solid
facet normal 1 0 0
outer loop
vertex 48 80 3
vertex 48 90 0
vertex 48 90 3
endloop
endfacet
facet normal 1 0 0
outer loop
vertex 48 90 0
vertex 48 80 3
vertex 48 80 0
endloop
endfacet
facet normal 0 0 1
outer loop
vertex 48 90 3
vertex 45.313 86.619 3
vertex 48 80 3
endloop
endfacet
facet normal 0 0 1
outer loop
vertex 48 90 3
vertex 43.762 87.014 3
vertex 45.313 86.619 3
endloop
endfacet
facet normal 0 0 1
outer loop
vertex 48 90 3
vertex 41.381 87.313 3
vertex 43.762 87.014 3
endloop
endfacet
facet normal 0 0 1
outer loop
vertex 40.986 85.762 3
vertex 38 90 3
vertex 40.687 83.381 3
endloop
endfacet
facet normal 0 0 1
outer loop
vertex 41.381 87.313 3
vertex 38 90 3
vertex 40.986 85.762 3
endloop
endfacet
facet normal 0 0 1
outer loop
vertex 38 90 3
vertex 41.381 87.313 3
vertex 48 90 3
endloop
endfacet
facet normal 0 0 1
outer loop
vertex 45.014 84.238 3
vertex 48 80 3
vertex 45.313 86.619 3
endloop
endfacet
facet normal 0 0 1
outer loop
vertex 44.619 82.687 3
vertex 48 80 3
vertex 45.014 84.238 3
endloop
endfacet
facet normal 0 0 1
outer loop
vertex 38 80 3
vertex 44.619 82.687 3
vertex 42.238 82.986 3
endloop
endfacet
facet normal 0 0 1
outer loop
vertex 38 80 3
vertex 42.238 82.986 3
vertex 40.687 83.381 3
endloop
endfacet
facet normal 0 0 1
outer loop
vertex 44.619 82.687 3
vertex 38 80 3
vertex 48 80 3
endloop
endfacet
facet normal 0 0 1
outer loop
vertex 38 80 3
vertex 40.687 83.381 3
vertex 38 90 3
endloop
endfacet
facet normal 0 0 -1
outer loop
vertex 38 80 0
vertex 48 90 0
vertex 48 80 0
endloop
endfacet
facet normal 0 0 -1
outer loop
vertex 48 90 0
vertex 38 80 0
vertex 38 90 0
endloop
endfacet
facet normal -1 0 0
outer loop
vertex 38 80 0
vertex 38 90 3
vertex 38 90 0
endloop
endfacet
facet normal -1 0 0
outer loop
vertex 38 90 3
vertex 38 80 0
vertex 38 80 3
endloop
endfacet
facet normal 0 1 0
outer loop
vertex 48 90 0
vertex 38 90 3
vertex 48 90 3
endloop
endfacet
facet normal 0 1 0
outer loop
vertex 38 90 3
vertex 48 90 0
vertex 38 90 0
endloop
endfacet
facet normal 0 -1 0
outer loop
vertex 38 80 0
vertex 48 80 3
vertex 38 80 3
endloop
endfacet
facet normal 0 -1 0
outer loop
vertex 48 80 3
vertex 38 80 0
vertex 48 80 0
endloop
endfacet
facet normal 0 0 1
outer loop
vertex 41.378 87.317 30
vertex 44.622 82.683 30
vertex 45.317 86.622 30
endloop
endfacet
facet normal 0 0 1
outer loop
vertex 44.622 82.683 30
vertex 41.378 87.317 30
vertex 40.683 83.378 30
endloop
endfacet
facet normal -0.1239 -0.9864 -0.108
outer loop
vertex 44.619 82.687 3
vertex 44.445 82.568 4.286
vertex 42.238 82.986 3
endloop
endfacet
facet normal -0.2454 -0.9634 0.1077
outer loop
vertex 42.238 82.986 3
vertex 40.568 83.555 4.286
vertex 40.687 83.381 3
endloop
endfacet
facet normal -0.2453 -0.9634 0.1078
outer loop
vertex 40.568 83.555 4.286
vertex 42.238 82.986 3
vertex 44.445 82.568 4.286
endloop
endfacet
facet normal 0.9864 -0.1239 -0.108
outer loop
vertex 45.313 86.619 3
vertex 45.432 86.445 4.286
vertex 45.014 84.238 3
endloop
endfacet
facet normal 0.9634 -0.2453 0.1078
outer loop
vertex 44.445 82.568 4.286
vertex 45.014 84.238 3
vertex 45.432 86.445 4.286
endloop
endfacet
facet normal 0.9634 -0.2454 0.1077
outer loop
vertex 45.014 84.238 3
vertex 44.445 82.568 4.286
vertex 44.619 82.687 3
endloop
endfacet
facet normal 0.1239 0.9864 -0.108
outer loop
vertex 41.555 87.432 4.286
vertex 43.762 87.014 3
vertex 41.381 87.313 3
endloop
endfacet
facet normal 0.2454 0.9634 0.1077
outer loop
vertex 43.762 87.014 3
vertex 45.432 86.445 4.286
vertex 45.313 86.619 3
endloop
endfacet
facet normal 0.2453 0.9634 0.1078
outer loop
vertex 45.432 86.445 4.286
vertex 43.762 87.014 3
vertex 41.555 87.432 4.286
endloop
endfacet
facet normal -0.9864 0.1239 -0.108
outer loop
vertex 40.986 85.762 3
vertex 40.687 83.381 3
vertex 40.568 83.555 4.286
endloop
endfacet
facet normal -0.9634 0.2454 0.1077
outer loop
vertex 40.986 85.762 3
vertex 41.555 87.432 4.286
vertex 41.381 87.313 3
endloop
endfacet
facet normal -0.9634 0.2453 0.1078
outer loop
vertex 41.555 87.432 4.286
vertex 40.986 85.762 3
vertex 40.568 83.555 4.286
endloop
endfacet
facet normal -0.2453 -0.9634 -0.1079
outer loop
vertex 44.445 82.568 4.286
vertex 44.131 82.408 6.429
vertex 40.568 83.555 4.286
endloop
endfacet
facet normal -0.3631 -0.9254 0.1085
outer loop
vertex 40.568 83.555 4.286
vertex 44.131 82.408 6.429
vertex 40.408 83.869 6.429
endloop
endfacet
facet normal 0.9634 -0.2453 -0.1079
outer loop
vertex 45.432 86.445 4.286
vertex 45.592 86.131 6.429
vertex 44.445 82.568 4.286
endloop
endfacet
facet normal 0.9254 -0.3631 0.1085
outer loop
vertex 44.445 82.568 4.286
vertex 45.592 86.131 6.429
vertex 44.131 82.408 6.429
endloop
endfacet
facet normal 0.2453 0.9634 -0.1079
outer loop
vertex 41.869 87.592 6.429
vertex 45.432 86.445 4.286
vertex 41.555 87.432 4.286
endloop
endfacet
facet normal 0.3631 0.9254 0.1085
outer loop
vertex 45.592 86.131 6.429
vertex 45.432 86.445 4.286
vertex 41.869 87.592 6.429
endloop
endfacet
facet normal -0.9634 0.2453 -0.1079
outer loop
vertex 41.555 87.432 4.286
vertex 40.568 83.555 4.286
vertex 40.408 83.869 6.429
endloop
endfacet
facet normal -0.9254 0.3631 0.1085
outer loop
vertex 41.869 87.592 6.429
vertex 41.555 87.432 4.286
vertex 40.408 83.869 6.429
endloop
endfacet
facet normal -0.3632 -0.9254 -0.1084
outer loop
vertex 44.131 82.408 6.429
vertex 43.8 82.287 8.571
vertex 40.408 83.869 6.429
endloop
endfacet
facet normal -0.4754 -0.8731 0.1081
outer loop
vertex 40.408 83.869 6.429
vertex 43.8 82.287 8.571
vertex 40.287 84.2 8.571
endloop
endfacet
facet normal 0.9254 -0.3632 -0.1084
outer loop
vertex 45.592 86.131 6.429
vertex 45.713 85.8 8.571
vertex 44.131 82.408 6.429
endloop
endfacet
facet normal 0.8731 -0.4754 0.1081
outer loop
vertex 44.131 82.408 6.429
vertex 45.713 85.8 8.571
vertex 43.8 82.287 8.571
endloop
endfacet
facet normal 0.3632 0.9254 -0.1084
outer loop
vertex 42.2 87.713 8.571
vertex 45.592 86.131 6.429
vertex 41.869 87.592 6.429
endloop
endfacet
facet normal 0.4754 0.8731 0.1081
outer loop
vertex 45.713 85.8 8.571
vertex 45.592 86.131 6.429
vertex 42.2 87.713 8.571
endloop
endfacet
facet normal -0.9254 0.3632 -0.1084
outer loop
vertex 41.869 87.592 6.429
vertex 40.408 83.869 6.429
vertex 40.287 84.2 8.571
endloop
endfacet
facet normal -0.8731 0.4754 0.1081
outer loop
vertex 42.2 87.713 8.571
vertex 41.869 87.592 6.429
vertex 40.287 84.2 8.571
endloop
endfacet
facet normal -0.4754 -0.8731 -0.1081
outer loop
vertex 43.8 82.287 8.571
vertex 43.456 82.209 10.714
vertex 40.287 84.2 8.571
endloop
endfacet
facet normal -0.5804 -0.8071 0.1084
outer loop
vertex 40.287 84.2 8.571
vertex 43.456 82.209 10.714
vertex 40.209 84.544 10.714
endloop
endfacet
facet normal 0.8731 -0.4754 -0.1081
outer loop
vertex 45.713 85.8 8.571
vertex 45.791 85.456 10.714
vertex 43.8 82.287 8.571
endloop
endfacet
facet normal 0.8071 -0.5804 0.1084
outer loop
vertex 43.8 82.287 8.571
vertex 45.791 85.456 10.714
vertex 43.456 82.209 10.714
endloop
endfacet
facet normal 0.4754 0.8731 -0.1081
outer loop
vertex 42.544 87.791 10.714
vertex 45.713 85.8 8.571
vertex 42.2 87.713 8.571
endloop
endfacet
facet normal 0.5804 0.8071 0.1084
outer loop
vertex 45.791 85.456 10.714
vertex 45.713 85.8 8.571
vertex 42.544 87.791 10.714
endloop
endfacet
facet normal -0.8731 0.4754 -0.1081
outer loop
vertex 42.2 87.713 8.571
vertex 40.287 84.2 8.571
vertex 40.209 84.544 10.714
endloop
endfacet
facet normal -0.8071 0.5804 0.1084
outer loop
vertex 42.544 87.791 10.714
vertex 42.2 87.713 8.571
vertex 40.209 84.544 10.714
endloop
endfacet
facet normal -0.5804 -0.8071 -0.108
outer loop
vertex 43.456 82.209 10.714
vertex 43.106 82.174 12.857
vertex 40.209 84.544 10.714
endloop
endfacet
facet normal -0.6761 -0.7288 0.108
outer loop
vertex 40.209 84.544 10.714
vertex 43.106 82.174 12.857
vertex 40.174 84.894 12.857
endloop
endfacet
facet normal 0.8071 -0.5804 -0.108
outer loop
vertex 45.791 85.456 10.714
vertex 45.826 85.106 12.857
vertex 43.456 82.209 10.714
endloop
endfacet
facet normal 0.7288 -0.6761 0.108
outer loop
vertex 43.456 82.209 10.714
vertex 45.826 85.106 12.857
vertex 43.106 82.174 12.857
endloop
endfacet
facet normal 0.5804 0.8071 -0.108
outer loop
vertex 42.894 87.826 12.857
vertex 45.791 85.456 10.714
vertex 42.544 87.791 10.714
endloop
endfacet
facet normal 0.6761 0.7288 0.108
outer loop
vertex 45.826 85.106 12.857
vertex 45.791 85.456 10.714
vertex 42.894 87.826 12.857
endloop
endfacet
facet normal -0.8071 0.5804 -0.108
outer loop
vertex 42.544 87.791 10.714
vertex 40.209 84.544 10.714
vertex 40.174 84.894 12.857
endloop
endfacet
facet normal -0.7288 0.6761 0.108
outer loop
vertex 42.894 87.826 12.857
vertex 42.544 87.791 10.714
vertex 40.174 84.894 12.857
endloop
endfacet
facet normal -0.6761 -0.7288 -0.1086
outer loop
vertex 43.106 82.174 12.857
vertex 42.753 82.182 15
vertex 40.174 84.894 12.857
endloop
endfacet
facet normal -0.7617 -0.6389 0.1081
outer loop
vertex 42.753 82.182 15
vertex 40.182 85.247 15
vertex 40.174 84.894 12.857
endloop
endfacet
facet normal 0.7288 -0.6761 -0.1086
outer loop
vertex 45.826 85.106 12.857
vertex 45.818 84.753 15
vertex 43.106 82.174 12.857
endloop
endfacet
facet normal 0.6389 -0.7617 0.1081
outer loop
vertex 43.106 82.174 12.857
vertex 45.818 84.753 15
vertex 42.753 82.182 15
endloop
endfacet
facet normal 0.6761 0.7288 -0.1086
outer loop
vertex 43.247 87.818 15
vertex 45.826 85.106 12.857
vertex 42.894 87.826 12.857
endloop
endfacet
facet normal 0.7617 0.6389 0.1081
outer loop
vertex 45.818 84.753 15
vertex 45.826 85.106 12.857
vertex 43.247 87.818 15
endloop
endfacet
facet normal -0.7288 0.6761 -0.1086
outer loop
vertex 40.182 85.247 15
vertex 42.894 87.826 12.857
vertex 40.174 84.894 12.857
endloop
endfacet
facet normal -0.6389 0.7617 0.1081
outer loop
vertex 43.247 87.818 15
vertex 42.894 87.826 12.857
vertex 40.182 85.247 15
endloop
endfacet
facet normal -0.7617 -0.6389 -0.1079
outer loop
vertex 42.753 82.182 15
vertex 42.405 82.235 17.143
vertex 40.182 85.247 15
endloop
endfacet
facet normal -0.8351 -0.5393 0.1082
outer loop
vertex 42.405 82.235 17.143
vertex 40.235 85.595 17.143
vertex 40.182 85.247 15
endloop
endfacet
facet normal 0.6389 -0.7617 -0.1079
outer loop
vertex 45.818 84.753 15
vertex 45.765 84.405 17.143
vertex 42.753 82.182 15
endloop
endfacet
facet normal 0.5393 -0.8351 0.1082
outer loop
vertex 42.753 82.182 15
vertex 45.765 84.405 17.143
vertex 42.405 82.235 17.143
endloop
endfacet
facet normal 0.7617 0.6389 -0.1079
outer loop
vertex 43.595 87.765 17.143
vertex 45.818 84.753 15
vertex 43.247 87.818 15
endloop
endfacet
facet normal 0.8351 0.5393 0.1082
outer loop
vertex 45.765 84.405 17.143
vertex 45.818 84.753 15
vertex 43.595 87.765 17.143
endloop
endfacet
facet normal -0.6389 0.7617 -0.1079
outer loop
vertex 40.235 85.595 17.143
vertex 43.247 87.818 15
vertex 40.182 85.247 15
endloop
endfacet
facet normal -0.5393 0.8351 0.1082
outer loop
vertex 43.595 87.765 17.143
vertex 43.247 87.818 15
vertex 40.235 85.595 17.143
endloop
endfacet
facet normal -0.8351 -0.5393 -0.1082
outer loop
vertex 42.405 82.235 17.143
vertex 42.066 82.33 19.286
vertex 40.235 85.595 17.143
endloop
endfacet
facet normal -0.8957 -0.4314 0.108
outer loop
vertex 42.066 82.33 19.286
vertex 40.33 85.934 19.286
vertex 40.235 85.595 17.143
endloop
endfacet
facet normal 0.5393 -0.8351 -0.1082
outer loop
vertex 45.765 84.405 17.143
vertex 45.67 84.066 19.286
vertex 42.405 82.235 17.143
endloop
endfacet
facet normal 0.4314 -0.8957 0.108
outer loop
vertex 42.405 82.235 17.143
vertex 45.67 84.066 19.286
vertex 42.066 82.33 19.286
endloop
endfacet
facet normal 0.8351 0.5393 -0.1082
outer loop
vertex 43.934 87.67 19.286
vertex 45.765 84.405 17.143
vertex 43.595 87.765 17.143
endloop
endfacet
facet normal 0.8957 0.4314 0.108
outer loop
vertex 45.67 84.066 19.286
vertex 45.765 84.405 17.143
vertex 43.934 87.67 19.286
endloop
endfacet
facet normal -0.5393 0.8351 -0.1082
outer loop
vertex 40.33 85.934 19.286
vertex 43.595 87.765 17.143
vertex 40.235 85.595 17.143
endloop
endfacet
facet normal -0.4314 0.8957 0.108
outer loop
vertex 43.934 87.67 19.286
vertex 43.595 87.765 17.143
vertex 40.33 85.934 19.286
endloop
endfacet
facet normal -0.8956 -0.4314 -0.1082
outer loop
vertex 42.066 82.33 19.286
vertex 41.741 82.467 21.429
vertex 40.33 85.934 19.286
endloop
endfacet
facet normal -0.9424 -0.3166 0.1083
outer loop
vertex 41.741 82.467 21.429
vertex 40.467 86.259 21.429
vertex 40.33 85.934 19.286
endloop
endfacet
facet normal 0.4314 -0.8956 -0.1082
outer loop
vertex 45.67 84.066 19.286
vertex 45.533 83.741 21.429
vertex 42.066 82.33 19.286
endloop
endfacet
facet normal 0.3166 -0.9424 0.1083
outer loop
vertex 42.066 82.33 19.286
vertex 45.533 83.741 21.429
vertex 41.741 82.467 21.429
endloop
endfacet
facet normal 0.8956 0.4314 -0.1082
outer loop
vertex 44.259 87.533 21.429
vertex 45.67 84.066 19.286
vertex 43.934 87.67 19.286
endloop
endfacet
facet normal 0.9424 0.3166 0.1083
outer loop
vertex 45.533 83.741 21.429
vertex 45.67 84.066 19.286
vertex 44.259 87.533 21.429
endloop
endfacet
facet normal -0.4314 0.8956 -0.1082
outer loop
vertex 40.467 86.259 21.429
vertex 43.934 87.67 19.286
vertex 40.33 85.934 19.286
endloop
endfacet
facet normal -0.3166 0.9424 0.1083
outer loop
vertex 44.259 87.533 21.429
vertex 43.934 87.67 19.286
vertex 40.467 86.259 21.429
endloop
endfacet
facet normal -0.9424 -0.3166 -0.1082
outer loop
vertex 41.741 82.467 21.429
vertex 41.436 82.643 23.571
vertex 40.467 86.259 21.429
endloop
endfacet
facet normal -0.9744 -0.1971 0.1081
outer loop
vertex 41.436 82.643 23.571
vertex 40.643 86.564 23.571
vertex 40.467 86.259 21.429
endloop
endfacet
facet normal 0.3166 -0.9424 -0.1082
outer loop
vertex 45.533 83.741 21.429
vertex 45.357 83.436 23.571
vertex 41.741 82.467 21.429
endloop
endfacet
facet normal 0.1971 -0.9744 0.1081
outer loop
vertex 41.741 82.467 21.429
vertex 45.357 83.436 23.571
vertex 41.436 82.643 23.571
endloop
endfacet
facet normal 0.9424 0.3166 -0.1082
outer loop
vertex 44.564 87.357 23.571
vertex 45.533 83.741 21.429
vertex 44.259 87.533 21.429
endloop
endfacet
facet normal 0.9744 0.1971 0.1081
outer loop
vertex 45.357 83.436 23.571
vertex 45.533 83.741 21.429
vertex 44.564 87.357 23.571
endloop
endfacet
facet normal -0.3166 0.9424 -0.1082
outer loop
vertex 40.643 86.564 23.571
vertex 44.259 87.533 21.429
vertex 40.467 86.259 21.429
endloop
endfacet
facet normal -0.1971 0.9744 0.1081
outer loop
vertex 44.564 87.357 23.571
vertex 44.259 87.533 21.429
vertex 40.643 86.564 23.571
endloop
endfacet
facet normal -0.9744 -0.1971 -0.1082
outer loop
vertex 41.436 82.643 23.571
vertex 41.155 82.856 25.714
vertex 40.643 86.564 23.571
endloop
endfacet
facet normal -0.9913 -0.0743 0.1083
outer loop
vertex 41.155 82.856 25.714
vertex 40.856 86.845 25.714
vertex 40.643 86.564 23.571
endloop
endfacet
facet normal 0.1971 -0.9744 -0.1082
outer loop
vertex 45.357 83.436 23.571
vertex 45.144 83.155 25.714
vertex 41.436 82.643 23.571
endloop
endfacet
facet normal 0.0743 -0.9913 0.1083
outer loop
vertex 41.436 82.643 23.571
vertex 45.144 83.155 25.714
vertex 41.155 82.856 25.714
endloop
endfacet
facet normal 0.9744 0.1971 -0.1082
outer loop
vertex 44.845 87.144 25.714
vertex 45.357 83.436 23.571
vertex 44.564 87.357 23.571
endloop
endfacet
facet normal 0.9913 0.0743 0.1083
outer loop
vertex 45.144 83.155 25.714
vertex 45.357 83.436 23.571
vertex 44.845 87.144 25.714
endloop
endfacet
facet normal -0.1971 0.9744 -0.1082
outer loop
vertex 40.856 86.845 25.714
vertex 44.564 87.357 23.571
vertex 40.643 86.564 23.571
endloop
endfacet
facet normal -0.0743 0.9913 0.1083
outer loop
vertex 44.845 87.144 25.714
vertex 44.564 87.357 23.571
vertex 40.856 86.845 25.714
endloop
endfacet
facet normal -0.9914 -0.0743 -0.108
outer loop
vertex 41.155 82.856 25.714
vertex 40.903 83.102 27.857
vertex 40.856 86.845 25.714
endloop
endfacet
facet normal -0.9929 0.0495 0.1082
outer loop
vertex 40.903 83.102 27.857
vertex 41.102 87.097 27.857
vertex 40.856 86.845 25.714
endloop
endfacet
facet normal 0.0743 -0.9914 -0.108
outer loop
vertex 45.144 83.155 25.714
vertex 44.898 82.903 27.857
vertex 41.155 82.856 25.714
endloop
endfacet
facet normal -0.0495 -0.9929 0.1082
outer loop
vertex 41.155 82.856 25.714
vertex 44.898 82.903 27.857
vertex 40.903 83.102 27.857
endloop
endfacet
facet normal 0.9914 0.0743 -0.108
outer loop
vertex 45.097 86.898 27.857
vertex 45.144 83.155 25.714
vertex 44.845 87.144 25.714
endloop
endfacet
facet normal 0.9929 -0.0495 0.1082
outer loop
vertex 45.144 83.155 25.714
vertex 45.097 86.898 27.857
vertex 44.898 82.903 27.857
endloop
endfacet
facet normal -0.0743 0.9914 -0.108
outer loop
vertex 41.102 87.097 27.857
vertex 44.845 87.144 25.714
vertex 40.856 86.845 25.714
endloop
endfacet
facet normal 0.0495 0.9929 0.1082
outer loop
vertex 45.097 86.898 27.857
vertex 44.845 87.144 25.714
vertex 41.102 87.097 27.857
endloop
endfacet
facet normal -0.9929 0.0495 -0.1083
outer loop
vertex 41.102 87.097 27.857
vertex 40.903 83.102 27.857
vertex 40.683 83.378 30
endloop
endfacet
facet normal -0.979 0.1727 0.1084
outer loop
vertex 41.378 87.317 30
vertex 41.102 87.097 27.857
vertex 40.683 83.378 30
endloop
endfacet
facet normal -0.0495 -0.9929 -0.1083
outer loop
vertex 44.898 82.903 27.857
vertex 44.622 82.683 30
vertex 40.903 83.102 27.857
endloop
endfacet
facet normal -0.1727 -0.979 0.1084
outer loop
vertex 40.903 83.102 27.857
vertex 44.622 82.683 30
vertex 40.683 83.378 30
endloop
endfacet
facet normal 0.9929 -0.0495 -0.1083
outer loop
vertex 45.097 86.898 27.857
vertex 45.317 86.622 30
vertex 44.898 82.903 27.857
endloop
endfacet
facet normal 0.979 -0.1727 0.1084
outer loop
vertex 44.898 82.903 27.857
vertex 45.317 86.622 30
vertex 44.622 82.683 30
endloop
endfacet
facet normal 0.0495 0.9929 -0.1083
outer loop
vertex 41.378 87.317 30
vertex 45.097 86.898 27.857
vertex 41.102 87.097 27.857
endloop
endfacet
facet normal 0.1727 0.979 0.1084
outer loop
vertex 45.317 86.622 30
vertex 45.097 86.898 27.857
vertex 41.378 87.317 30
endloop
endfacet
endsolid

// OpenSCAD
// file: utils/prism.scad
module prism(l, w, h1, h2){
       polyhedron(
               points=[[0,0,0], [l,0,0], [l,w,0], [0,w,0],
                        [0,0,h1], [l,0,h1], [0,w,h2], [l,w,h2]],
               faces=[[0,1,2,3], [1, 0, 4, 5], [5, 4, 6, 7], [7, 6, 3, 2],
                        [4, 0, 3, 6], [2, 1, 5, 7]]
               );
}

prism(5, 10, 3, 7);
// main file
use <utils/prism.scad>

$fn=50;

slice_height=0.4;

module holder_base(offset) {
    linear_extrude(slice_height) hull() {
        translate([1, 1, 0]) circle(d=3);
        translate([94-offset, 52-offset, 0]) circle(d=3);
        translate([1, 52-offset, 0]) circle(d=3);
        translate([94-offset, 1, 0]) circle(d=3);
        translate([96-offset, 26-offset, 0]) circle(d=3);
        translate([-3, 26-offset, 0]) circle(d=3);
    }
}

module holder_block(offset) {
    for(z=[0:slice_height:15]) {
        zRatio=z/15;
        translate([1.5*zRatio, 8*zRatio, z])
            scale([1-0.04*zRatio,1-0.2*zRatio, 1])
                holder_base(offset);
    }
}

//difference() {
//    holder_block(0);
//    
//    //curving the ez-pass
//    translate([2, 2, 1.2]) holder_block(4);
//    //some openings around
//    translate([-5, 10, 1.2]) cube([108, 34, 20]);
//    
//    translate([10, -5, 1.2]) cube([74, 80, 20]);
//}
//
//translate([38, 50, 0]) {
//    difference() {
//        cube([20, 20, 1.2]);
//        translate([8, 8, 0]) cube([4, 4, 4]);
//    }
//}

translate([38, 80, 0]) {
    cube([10, 10, 3]);
    translate([5, 5, 0]) linear_extrude(30, twist=100) square([4,4], center=true);
}
